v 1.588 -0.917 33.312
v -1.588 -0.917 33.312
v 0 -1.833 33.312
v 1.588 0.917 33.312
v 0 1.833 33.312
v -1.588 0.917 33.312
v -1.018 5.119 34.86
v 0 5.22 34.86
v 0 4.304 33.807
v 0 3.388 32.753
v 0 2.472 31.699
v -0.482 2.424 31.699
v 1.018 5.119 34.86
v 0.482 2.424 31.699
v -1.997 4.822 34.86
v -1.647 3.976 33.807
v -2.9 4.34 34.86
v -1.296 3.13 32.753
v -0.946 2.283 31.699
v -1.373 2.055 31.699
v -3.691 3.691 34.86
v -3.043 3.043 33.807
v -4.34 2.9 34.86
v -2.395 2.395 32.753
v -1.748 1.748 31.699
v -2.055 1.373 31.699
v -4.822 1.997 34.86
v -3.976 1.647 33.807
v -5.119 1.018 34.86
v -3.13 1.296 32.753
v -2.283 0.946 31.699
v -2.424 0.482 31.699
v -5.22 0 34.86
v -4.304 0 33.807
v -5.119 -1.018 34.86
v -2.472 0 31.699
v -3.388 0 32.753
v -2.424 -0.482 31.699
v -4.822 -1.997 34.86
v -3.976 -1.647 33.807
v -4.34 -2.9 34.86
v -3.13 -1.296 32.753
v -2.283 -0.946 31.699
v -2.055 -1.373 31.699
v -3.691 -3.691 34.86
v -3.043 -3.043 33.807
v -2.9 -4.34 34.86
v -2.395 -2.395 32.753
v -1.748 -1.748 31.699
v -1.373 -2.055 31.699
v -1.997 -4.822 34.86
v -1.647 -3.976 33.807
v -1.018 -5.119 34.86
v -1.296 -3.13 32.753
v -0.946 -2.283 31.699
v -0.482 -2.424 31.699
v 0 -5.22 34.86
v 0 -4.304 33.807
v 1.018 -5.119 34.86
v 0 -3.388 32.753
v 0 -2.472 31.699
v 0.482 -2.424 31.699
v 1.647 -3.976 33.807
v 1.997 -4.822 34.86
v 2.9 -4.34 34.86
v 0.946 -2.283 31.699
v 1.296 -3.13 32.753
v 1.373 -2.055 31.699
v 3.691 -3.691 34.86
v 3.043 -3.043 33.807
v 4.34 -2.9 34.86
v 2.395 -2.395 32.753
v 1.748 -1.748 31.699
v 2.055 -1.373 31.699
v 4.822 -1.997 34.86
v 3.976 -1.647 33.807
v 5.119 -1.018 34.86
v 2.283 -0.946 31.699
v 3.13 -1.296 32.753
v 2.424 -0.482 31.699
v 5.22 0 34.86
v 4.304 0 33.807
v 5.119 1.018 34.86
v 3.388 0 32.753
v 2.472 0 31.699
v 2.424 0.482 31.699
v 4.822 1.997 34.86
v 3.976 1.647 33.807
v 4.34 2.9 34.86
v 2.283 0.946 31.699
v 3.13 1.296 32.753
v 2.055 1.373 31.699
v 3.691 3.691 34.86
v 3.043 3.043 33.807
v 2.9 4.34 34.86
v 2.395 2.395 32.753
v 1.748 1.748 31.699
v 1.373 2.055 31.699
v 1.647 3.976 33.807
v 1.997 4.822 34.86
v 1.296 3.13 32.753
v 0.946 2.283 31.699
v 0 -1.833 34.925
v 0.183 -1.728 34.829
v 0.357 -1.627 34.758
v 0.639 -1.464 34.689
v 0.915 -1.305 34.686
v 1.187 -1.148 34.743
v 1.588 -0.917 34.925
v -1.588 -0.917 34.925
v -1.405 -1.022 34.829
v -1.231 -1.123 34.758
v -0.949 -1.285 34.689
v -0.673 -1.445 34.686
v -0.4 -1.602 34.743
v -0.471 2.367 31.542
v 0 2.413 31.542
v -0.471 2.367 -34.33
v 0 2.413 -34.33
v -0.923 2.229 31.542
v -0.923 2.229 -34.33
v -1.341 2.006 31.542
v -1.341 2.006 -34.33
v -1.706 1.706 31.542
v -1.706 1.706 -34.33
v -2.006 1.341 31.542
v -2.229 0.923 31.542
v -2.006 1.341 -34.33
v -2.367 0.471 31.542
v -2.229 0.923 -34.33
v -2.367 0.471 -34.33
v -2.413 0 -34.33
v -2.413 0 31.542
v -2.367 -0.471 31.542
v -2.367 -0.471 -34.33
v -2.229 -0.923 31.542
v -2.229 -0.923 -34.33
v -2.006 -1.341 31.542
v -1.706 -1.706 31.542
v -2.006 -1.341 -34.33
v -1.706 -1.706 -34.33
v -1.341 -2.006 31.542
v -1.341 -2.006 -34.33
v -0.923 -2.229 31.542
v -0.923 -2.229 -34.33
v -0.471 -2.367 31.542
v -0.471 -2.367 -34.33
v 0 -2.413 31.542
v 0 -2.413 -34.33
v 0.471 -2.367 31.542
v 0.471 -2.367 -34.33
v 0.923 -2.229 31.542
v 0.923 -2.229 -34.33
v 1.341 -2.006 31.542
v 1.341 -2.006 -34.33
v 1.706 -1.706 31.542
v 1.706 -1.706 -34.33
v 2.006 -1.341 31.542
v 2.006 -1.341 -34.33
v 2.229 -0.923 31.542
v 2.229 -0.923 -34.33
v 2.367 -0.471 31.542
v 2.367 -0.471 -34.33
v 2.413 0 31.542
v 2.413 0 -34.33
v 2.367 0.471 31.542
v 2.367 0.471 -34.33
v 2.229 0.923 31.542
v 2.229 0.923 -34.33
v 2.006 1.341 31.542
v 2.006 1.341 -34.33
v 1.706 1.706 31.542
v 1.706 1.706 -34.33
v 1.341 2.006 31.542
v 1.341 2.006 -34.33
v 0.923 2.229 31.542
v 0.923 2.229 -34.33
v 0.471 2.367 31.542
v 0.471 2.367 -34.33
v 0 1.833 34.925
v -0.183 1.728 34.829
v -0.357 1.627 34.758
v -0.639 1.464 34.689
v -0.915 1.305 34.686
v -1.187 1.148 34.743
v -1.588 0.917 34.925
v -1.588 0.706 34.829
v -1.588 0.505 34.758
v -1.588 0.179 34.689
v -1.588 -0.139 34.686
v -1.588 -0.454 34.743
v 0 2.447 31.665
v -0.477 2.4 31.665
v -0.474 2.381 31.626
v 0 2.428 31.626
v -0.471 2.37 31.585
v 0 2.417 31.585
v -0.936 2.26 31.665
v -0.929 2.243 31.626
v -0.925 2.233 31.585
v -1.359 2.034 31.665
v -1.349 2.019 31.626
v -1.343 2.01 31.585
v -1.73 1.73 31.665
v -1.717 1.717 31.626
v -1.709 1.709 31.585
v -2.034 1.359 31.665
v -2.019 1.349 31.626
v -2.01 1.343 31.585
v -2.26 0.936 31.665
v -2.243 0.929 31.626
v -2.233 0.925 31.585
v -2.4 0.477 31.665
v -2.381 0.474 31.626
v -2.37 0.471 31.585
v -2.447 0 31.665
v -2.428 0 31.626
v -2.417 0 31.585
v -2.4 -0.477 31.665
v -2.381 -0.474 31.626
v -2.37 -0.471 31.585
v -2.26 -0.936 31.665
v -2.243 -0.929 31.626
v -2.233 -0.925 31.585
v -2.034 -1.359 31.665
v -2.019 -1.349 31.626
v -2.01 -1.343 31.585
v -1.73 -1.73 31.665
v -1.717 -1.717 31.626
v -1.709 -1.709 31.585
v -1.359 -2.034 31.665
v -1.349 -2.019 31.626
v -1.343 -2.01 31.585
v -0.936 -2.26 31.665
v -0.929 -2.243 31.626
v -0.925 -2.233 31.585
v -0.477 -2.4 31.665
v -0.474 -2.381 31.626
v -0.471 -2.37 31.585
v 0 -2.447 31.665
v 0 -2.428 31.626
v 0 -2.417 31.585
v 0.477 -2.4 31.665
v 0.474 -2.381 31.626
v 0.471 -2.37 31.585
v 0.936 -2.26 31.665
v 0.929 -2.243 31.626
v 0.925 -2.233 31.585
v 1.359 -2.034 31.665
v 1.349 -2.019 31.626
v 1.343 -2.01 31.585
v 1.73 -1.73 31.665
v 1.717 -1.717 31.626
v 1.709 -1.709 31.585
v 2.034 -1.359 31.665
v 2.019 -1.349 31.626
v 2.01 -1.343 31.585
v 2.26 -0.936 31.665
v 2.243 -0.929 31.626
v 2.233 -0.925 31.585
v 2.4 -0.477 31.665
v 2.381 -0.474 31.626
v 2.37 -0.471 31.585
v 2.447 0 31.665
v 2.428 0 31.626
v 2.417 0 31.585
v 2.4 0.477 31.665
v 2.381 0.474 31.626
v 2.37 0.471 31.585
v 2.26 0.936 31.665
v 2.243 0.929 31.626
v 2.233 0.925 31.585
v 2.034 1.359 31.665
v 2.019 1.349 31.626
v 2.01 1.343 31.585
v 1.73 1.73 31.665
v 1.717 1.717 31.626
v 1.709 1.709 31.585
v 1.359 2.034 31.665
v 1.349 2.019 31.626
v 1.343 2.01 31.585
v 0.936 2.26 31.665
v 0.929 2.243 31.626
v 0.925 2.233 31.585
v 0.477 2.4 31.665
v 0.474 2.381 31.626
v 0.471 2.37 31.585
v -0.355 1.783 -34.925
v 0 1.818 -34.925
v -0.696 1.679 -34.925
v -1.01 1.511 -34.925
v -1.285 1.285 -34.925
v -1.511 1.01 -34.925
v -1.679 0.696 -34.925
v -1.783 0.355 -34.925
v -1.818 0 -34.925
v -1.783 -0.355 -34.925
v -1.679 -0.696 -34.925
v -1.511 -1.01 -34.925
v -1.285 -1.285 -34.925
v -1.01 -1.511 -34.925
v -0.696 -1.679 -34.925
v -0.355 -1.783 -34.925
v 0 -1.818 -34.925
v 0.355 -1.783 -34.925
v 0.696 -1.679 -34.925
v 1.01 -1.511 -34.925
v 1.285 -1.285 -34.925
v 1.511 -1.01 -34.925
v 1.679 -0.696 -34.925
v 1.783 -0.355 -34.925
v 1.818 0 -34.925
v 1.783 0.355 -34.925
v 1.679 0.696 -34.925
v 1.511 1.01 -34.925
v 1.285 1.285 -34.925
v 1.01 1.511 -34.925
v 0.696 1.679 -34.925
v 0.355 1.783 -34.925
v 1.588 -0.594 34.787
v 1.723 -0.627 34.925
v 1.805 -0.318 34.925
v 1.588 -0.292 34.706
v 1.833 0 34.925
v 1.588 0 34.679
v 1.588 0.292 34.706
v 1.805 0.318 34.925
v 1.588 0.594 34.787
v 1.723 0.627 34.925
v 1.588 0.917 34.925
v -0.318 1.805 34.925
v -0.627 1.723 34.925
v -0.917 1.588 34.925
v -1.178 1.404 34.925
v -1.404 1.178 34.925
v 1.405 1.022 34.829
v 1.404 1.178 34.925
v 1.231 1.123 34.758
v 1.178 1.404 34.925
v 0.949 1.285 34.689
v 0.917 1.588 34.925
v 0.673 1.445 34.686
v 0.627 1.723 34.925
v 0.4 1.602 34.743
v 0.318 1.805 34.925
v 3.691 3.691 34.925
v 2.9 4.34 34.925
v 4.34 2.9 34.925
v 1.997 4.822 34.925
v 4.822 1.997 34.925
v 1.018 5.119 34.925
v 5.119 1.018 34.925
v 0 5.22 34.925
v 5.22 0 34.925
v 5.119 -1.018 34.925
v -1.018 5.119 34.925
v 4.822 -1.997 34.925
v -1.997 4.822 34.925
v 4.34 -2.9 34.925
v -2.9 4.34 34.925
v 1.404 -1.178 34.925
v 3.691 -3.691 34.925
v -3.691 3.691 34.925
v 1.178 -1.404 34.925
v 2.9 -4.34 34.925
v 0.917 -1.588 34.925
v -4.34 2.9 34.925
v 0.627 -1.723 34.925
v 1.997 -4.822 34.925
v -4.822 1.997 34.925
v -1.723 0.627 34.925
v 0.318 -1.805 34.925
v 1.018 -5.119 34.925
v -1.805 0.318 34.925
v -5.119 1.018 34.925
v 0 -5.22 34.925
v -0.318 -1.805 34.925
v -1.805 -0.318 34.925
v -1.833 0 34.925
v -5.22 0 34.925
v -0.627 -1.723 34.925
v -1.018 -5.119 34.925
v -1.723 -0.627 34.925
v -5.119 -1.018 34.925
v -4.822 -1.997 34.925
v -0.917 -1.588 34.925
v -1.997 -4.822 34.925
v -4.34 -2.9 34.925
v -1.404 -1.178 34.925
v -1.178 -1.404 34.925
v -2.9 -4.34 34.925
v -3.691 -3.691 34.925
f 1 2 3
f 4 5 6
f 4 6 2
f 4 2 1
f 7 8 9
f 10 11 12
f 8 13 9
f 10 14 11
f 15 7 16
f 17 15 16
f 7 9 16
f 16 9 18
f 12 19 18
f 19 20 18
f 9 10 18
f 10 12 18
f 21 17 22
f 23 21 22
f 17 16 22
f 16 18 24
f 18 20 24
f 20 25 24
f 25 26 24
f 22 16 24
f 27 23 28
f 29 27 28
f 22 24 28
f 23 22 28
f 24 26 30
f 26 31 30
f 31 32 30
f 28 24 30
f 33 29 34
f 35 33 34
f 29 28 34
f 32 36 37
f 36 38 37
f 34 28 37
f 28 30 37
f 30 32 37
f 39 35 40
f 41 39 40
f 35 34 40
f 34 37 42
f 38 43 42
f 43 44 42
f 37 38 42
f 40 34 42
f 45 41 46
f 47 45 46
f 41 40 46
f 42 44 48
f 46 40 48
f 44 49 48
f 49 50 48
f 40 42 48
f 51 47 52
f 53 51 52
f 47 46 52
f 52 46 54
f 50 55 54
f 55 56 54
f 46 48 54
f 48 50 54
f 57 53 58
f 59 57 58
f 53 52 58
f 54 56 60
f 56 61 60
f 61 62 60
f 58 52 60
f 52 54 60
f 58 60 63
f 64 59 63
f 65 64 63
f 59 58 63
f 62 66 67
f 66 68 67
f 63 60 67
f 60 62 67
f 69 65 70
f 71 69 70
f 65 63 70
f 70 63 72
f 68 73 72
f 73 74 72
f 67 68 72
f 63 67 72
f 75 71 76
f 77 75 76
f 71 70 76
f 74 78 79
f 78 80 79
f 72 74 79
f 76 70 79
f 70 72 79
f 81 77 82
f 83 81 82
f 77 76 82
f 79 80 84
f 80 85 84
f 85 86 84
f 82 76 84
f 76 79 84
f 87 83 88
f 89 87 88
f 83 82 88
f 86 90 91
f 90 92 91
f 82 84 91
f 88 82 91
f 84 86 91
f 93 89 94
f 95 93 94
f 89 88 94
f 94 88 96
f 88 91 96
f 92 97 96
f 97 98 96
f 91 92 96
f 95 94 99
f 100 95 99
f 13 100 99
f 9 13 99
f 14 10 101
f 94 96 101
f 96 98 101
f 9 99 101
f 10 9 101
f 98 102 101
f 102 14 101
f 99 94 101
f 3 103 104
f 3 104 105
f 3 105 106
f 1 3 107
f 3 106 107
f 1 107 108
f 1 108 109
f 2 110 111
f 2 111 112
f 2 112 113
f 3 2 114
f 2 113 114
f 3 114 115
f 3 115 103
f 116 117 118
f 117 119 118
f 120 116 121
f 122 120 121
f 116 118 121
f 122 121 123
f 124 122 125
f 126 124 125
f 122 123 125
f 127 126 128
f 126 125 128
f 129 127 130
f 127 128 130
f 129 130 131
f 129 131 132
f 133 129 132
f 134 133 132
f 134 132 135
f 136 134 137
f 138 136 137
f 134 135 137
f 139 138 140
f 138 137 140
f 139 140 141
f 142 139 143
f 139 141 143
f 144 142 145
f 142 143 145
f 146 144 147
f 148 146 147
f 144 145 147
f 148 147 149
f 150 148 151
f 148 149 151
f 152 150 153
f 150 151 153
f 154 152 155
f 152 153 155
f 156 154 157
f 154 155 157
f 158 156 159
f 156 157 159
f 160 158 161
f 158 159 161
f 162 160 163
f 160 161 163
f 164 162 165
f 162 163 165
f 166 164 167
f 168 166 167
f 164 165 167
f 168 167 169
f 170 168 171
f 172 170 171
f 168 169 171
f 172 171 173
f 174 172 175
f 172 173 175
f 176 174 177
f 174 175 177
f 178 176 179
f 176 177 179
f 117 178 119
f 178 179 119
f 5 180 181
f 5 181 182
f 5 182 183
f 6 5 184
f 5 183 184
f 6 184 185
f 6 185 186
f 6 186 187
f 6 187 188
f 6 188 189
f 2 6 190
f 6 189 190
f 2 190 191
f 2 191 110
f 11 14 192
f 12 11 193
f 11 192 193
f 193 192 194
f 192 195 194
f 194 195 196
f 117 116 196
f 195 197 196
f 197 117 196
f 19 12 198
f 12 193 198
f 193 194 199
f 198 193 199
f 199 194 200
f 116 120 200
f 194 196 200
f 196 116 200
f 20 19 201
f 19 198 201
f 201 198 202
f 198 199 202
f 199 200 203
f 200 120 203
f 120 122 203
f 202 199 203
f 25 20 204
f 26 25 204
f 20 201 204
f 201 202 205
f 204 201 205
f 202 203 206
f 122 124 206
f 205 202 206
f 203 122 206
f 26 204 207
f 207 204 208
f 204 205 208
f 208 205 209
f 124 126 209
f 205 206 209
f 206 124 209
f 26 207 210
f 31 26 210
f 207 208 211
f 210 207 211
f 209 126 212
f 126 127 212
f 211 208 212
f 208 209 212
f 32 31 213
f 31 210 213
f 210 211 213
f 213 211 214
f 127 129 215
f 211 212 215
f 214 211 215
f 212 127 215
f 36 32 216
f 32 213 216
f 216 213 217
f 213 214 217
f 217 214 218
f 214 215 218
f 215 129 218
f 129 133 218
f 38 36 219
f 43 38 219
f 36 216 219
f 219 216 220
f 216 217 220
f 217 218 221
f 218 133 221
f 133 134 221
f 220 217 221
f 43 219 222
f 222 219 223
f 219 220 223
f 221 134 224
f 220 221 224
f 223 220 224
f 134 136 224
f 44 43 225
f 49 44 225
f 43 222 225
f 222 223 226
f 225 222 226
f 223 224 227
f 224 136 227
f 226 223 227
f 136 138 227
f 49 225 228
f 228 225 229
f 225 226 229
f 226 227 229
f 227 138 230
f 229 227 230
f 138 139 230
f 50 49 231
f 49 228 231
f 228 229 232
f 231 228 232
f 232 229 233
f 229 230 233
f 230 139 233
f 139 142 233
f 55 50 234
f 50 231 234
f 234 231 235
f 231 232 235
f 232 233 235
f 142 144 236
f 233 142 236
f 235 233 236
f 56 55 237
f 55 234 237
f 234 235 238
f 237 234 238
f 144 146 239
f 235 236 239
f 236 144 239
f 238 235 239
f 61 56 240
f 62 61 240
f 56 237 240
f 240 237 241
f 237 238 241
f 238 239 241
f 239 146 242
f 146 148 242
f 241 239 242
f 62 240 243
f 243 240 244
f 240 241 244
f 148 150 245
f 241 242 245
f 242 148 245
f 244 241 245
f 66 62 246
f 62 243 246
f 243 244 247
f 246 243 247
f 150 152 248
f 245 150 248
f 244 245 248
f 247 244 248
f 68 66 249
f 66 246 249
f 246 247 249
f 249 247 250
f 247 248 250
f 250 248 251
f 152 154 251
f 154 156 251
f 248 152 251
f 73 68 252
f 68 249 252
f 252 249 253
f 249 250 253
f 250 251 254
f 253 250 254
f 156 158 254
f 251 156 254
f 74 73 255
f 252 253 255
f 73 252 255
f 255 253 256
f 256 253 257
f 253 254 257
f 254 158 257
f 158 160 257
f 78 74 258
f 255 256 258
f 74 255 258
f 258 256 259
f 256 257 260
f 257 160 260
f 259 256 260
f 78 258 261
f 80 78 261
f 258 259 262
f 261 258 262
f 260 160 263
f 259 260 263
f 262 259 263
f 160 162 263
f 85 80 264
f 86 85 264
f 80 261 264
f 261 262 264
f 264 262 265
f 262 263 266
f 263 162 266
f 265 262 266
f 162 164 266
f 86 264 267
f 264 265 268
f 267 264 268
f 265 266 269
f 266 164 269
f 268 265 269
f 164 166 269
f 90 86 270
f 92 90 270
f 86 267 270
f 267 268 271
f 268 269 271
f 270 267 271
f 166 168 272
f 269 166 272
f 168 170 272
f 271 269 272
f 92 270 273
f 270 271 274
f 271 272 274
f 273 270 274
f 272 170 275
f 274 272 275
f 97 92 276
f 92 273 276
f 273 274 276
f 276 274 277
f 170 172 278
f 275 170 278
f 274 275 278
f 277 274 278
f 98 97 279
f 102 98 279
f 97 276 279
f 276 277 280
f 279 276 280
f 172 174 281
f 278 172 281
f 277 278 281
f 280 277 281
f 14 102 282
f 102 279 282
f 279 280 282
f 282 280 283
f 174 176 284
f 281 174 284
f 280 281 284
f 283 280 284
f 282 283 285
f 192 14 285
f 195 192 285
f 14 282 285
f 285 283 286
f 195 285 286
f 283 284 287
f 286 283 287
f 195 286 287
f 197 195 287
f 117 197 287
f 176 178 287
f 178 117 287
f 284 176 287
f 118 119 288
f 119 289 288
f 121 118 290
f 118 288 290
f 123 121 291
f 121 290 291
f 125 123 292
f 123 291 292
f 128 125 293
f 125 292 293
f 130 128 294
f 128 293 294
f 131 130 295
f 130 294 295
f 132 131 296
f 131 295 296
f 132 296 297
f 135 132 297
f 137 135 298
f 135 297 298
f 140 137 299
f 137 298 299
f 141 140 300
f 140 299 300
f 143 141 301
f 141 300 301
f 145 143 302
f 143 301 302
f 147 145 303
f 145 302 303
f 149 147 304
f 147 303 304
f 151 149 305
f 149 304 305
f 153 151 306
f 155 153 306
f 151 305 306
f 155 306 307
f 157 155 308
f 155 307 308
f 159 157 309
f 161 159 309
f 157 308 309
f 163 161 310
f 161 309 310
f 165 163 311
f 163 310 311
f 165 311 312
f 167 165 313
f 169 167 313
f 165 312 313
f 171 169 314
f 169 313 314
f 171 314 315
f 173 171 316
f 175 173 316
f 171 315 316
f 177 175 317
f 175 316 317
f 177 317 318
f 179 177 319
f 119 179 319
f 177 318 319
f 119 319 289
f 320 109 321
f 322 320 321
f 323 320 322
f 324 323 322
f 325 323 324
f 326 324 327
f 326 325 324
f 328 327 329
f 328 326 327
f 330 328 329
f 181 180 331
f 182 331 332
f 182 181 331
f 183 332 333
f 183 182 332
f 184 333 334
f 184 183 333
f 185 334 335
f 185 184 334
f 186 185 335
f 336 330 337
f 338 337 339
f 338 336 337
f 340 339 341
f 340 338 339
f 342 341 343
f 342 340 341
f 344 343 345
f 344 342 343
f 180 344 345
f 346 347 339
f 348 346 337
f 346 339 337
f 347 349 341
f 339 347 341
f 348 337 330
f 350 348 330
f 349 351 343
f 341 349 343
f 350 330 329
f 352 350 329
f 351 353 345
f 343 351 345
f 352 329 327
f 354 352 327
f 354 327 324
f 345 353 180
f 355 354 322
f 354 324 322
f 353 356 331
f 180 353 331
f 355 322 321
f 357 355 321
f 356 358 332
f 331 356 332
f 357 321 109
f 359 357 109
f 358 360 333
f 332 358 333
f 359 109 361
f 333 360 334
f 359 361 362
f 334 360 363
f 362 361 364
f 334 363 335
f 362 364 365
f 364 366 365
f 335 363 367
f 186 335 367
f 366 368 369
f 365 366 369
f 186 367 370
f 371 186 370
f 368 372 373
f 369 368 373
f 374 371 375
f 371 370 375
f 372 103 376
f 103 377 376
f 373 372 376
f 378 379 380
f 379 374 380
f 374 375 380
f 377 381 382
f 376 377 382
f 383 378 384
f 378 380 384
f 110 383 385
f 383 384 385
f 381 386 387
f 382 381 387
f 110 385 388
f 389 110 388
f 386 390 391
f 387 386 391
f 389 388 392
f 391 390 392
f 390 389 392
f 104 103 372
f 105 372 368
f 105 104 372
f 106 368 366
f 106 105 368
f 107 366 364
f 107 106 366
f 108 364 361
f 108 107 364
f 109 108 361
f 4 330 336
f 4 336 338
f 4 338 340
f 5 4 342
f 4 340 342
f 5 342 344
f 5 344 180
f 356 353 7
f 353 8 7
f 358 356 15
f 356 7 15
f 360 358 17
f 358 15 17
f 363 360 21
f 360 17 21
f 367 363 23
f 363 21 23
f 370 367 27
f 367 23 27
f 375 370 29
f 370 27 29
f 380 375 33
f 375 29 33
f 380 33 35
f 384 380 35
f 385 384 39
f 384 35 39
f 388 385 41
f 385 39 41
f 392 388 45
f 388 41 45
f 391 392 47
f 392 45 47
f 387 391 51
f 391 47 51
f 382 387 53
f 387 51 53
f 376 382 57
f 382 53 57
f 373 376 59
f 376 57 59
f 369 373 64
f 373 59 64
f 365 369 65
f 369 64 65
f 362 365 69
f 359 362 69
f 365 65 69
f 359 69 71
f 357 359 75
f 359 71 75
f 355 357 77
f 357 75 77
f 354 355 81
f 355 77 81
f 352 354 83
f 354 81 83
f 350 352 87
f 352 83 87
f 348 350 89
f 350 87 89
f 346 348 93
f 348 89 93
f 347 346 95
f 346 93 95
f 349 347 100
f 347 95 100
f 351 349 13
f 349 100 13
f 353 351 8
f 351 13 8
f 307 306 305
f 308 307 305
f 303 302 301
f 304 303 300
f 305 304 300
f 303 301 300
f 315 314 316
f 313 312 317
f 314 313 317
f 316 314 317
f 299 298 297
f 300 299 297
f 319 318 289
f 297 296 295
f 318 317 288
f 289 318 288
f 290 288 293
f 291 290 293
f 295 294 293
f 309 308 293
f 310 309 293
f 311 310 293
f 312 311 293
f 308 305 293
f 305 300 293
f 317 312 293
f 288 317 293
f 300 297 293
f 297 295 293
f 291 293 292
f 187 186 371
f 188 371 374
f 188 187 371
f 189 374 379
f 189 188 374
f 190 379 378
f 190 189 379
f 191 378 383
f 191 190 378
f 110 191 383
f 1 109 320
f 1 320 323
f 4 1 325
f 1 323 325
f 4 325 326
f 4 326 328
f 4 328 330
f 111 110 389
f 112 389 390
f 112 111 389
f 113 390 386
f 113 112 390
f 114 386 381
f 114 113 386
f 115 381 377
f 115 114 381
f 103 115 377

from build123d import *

# Parameters (mm, degrees)
SKETCH10_R         = 1.833087105
CUT_EXTRUDE2_DEPTH = 1.6129
CUT_EXTRUDE2_TAPER = 45
CUT_EXTRUDE1_DEPTH = 1.6129


with BuildPart() as part:
    # Sketch2 → Revolve1 (revolve)
    with BuildSketch(Plane(origin=(0, 0, 0), x_dir=(0, 0, -1), z_dir=(1, 0, 0))):
        with BuildLine():
            Line((-34.860484, 5.2197), (-31.6992, 2.471637744))
            ThreePointArc((-31.6992, 2.471637744), (-31.62608483, 2.428138789), (-31.542366229, 2.413))
            Line((-31.542366229, 2.413), (34.3296875, 2.413))
            Line((34.3296875, 2.413), (34.925, 1.8176875))
            Line((34.925, 1.8176875), (34.925, 0))
            Line((34.925, 0), (-34.925, 0))
            Line((-34.925, 0), (-34.925, 5.2197))
            Line((-34.925, 5.2197), (-34.860484, 5.2197))
        make_face()
    revolve(axis=Axis((0, 0, -34.925), (0, 0, 1)))

    # Sketch10 → Cut-Extrude2 (cut)
    with BuildSketch(Plane.XY.offset(34.925)):
        Circle(SKETCH10_R)
    extrude(amount=-CUT_EXTRUDE2_DEPTH, taper=CUT_EXTRUDE2_TAPER, mode=Mode.SUBTRACT)

    # Sketch9 → Cut-Extrude1 (cut)
    with BuildSketch(Plane.XY.offset(34.925)):
        Polygon((1.5875, -0.916543552), (1.5875, 0.916543552), (0, 1.833087105), (-1.5875, 0.916543552), (-1.5875, -0.916543552), (0, -1.833087105), align=None)
    extrude(amount=-CUT_EXTRUDE1_DEPTH, mode=Mode.SUBTRACT)


solid = part.part
